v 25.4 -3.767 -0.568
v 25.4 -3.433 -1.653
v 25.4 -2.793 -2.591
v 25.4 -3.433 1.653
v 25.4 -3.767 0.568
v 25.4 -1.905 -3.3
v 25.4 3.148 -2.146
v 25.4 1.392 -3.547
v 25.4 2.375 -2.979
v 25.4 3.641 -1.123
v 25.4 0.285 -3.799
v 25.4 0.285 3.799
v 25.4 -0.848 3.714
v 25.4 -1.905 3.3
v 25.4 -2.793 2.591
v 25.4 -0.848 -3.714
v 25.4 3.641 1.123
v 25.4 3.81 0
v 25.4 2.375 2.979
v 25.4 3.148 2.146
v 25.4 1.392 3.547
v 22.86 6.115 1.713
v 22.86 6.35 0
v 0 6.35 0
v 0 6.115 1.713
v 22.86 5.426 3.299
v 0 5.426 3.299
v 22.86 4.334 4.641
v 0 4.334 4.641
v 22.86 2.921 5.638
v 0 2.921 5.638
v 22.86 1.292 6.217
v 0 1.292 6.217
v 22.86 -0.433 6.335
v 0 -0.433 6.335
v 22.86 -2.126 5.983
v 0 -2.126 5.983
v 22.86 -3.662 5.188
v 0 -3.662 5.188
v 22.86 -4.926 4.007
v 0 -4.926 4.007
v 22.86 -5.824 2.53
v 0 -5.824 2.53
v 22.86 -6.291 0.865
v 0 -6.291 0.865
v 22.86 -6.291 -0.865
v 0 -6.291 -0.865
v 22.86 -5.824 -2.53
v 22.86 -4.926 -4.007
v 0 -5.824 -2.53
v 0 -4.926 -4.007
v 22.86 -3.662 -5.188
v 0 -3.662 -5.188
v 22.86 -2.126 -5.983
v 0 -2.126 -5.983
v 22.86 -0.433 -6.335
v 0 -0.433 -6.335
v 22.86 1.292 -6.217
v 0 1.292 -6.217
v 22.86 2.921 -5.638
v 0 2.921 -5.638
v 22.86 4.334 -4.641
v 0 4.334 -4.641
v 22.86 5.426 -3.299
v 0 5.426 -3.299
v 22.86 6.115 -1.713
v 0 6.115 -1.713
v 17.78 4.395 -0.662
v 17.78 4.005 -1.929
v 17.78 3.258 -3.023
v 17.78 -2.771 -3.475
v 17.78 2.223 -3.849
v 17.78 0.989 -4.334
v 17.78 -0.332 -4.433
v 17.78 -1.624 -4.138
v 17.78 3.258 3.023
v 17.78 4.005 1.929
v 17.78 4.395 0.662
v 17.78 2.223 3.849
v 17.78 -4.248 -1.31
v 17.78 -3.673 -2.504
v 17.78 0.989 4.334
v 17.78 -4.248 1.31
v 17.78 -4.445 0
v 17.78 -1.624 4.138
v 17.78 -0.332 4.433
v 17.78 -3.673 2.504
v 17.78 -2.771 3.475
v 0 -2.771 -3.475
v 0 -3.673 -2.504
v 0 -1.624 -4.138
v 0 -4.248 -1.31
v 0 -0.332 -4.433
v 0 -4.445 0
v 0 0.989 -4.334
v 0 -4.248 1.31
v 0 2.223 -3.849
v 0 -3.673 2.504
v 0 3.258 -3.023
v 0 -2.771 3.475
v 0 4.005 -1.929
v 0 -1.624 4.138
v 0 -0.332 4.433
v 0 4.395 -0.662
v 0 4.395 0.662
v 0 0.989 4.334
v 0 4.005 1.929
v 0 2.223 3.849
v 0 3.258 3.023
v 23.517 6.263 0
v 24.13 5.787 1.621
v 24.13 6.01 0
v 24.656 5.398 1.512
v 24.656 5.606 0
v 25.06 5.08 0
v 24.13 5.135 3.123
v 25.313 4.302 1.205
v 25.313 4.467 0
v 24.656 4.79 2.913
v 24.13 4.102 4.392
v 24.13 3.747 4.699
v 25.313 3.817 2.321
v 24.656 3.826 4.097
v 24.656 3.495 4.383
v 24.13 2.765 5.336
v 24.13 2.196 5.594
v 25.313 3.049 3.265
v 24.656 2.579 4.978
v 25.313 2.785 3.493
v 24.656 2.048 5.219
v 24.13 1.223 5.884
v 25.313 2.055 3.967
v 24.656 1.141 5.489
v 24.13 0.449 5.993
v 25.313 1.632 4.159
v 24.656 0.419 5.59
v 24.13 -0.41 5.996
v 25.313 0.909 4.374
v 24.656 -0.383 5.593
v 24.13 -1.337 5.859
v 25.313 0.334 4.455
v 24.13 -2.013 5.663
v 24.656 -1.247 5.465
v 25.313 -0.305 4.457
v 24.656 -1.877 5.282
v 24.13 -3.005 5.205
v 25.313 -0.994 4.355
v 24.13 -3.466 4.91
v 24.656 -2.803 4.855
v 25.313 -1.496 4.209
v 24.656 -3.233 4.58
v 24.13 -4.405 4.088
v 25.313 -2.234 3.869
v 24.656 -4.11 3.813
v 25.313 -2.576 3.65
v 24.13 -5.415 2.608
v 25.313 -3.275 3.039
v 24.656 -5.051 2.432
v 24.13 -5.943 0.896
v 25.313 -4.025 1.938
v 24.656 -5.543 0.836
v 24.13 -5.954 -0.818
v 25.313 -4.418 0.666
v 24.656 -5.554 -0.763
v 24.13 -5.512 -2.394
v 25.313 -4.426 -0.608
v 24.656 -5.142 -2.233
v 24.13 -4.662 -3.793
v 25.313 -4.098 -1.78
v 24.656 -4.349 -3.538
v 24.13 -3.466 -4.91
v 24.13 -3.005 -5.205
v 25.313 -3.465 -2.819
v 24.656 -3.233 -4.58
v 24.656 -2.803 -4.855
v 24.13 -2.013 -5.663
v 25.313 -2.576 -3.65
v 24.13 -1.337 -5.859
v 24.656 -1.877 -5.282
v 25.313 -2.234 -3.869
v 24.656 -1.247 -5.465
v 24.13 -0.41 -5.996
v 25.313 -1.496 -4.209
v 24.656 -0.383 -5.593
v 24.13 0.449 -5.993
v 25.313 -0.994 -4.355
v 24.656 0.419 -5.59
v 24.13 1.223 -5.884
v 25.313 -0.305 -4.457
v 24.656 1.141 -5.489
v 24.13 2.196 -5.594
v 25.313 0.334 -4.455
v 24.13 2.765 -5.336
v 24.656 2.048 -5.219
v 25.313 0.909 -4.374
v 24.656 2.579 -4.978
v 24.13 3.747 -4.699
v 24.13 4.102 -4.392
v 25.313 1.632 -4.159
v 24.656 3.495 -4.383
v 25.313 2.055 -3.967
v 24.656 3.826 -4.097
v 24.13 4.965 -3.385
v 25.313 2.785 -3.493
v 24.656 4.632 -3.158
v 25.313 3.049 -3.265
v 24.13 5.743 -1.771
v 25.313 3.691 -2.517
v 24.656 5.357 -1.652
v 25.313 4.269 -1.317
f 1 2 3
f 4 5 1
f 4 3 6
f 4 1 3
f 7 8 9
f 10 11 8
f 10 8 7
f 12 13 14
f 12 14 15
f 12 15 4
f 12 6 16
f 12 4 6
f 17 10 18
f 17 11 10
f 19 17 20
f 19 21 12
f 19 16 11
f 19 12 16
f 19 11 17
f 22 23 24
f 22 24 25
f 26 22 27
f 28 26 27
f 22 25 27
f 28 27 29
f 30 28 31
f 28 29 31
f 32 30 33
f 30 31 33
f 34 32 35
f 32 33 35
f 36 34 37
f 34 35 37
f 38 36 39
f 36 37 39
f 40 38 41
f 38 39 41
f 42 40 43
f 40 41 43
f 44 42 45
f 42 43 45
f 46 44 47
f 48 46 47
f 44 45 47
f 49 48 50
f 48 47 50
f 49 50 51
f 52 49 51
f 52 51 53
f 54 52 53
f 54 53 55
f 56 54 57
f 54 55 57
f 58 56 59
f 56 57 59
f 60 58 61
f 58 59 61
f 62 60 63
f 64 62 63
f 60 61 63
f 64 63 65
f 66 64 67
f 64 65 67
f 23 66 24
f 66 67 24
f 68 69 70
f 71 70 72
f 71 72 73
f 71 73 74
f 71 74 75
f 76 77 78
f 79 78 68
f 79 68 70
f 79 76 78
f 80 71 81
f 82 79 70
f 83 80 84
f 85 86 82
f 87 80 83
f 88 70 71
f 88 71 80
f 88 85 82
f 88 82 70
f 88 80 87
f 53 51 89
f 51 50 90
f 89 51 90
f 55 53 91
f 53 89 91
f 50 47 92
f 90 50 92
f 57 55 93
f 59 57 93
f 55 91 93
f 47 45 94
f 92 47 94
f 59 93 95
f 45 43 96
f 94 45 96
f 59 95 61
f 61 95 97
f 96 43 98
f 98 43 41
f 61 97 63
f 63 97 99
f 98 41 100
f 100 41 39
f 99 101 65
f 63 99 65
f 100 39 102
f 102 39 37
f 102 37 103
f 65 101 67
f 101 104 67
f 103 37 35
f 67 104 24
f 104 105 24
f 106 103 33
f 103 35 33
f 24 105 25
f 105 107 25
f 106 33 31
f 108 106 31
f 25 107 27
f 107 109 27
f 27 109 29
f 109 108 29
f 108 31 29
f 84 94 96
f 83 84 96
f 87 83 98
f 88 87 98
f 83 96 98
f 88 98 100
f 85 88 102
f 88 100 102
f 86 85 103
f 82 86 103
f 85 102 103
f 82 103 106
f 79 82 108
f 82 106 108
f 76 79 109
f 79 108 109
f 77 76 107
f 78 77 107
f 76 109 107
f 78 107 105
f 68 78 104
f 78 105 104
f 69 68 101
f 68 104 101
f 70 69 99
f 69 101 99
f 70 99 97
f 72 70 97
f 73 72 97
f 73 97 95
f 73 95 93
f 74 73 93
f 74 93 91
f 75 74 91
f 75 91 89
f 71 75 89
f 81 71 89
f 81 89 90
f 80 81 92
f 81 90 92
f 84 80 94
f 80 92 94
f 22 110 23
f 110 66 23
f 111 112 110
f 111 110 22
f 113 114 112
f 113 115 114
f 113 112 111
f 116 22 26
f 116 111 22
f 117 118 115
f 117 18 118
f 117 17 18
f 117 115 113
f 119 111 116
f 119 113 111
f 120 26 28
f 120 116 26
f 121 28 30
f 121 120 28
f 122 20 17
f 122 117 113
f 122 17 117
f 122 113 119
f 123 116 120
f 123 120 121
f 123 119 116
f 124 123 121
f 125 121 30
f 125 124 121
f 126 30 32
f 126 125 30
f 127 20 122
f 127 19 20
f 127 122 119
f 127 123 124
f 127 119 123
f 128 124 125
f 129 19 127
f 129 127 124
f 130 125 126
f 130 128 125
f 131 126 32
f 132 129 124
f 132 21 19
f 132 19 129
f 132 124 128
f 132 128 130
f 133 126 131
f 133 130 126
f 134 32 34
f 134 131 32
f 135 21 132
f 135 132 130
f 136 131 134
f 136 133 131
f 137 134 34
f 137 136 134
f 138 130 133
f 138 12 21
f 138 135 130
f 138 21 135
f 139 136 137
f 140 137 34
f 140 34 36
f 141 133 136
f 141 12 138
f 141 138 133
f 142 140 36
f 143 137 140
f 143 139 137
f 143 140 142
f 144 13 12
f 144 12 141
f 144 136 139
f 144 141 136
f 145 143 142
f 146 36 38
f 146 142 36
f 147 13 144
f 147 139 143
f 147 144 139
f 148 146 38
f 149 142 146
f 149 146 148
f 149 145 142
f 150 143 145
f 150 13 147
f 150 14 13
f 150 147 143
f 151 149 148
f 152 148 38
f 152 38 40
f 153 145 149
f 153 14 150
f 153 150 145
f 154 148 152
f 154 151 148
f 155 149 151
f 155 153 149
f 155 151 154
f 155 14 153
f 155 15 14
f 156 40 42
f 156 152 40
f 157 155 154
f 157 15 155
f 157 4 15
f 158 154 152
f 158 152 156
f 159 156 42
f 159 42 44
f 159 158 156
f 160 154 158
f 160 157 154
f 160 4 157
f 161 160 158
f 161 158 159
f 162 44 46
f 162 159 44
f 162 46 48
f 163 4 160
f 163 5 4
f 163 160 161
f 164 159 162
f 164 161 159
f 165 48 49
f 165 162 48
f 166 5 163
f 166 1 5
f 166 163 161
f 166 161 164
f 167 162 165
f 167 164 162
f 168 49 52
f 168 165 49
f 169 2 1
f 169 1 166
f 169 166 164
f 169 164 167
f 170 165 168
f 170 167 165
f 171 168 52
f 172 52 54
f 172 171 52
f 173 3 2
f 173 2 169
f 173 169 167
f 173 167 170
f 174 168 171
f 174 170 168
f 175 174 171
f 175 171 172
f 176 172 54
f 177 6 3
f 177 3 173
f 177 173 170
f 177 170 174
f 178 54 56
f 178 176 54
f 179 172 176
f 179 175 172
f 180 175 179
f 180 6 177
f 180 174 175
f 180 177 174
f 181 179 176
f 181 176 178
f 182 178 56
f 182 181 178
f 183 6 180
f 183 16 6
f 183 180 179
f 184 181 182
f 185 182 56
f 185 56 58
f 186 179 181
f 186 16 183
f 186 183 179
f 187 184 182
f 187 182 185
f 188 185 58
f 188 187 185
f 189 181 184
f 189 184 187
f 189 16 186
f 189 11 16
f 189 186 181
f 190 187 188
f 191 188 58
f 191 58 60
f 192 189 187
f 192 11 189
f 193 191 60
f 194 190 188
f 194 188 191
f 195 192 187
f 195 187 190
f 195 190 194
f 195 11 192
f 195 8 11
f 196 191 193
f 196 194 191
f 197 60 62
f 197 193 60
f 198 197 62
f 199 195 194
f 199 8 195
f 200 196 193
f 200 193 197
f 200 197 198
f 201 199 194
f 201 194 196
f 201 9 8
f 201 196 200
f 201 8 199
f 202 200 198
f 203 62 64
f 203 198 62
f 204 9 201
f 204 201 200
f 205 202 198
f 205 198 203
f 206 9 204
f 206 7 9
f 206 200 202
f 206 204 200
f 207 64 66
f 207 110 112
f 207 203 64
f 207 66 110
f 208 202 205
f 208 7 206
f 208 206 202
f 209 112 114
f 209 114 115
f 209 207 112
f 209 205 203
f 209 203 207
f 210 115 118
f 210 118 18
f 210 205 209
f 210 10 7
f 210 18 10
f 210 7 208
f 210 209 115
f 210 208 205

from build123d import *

# Parameters (mm, degrees)
F0_R     = 6.35
F1_DEPTH = 25.4
F2_R     = 4.445
F3_DEPTH = 17.78
F4_R     = 2.54


with BuildPart() as f1:
    # F0 (on Right) → F1 (new body)
    with BuildSketch(Plane.YZ):
        Circle(F0_R)
    extrude(amount=F1_DEPTH)

    # F2 (on face) → F3 (cut)
    with BuildSketch(Plane(origin=(0, 0, 0), x_dir=(0, -1, 0), z_dir=(-1, 0, 0))):
        Circle(F2_R)
    extrude(amount=-F3_DEPTH, mode=Mode.SUBTRACT)

    # F4
    f4_edges = [f1.edges().sort_by_distance(p)[0] for p in [
        (25.4, -6.35, 0),
    ]]
    fillet(f4_edges, radius=F4_R)


solid = f1.part
